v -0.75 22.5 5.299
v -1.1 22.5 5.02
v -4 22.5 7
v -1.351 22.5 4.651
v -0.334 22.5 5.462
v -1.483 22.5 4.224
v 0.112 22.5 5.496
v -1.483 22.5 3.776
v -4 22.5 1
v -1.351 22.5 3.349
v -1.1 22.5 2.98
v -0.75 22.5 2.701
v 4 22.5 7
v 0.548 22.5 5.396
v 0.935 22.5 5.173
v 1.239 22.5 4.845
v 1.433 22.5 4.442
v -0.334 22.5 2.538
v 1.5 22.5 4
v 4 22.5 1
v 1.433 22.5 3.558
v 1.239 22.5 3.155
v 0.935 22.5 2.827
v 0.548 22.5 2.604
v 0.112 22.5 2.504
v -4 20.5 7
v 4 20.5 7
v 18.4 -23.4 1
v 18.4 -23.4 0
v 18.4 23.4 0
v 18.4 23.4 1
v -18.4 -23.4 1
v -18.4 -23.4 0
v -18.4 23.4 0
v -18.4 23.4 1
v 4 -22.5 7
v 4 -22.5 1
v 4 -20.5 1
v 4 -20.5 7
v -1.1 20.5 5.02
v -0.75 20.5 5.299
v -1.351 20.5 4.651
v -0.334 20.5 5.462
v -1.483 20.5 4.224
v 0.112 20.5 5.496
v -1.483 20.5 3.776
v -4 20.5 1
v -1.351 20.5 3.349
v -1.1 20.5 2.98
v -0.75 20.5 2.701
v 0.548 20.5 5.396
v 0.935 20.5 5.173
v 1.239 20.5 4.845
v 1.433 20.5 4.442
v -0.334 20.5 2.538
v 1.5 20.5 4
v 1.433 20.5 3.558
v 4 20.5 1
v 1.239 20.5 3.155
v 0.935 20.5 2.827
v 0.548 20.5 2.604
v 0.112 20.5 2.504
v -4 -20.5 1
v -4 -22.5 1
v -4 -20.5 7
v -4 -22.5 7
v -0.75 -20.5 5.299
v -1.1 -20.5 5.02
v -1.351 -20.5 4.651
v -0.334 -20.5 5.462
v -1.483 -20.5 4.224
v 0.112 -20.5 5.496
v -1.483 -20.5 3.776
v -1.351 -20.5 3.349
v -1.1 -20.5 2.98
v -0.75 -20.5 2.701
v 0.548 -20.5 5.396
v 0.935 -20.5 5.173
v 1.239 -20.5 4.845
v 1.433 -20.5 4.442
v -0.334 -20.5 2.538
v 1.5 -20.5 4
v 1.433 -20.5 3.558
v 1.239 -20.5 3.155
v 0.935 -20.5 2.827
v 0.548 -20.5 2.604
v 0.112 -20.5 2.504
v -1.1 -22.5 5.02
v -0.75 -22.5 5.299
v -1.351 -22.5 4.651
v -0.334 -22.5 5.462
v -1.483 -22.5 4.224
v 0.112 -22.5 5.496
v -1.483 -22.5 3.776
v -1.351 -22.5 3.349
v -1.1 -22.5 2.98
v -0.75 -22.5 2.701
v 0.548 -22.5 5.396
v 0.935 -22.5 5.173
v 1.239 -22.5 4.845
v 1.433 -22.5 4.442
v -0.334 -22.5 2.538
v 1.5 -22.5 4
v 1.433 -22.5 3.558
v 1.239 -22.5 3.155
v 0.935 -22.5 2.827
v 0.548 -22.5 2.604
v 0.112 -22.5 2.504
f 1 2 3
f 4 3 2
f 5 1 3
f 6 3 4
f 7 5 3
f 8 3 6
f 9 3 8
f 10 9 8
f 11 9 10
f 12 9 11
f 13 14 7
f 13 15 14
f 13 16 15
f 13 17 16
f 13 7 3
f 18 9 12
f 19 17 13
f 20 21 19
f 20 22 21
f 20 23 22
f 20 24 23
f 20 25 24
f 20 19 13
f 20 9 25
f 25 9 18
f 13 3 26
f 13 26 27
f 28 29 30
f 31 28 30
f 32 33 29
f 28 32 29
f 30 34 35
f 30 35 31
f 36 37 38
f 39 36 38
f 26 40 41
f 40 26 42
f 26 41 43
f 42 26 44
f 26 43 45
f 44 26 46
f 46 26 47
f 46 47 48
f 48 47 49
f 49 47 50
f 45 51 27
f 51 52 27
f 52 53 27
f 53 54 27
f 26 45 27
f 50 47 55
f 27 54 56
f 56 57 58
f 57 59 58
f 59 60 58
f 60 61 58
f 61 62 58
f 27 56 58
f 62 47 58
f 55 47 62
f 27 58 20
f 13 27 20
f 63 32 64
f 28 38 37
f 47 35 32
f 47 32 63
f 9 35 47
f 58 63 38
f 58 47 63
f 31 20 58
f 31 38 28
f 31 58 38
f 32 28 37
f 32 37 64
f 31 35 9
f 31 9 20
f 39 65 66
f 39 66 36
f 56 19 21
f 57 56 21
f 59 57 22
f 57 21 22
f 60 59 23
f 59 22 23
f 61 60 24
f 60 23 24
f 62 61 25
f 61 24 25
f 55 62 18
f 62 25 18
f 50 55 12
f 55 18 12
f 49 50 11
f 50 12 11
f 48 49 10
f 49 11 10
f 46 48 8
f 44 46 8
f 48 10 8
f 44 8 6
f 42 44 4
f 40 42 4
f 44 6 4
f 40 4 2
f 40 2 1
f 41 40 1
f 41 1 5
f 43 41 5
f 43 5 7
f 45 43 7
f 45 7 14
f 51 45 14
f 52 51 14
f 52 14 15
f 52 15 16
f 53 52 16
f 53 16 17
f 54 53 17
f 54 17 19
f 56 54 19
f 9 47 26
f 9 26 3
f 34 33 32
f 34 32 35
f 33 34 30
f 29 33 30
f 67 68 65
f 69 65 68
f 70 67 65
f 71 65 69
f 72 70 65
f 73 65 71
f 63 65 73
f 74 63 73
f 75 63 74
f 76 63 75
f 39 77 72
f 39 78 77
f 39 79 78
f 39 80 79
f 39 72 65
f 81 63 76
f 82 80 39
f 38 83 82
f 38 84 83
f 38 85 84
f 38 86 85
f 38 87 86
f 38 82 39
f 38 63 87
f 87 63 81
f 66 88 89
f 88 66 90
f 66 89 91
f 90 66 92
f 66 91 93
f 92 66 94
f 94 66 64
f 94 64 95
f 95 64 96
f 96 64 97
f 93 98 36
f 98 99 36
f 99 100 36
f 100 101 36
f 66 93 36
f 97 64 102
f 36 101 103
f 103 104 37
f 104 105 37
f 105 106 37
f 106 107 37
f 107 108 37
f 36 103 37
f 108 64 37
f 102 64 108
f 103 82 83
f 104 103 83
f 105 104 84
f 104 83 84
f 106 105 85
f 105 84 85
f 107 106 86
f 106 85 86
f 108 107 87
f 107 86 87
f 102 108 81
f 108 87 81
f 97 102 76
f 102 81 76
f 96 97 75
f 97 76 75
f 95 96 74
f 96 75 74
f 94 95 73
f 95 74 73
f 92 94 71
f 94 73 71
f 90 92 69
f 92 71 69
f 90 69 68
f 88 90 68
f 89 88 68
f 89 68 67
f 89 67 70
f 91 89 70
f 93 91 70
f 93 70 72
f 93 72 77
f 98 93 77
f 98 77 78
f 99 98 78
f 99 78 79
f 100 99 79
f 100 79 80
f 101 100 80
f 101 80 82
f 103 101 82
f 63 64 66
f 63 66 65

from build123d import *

# Parameters (mm, degrees)
CROQUIS1_W              = 36.8
CROQUIS1_H              = 46.8
SALIENTE_EXTRUIR1_DEPTH = 1
CROQUIS2_W              = 8
CROQUIS2_H              = 2
SALIENTE_EXTRUIR2_DEPTH = 7
CROQUIS2_3_W            = 8
CROQUIS2_3_H            = 2
SALIENTE_EXTRUIR3_DEPTH = 7
CROQUIS6_R              = 1.5
CORTAR_EXTRUIR1_DEPTH   = 46.9


with BuildPart() as part:
    # Croquis1 → Saliente-Extruir1 (new body)
    with BuildSketch(Plane.XY):
        Rectangle(CROQUIS1_W, CROQUIS1_H)
    extrude(amount=SALIENTE_EXTRUIR1_DEPTH)

    # Croquis2 → Saliente-Extruir2 (add)
    with BuildSketch(Plane.XY):
        with Locations((0, 21.5)):
            Rectangle(CROQUIS2_W, CROQUIS2_H)
    extrude(amount=SALIENTE_EXTRUIR2_DEPTH)

    # Croquis2<3> → Saliente-Extruir3 (add)
    with BuildSketch(Plane.XY):
        with Locations((0, -21.5)):
            Rectangle(CROQUIS2_3_W, CROQUIS2_3_H)
    extrude(amount=SALIENTE_EXTRUIR3_DEPTH)

    # Croquis6 → Cortar-Extruir1 (cut, through all)
    with BuildSketch(Plane(origin=(0, 22.5, 0), x_dir=(1, 0, 0), z_dir=(0, 1, 0))):
        with Locations((0, -4)):
            Circle(CROQUIS6_R)
    extrude(amount=-CORTAR_EXTRUIR1_DEPTH, mode=Mode.SUBTRACT)


solid = part.part
